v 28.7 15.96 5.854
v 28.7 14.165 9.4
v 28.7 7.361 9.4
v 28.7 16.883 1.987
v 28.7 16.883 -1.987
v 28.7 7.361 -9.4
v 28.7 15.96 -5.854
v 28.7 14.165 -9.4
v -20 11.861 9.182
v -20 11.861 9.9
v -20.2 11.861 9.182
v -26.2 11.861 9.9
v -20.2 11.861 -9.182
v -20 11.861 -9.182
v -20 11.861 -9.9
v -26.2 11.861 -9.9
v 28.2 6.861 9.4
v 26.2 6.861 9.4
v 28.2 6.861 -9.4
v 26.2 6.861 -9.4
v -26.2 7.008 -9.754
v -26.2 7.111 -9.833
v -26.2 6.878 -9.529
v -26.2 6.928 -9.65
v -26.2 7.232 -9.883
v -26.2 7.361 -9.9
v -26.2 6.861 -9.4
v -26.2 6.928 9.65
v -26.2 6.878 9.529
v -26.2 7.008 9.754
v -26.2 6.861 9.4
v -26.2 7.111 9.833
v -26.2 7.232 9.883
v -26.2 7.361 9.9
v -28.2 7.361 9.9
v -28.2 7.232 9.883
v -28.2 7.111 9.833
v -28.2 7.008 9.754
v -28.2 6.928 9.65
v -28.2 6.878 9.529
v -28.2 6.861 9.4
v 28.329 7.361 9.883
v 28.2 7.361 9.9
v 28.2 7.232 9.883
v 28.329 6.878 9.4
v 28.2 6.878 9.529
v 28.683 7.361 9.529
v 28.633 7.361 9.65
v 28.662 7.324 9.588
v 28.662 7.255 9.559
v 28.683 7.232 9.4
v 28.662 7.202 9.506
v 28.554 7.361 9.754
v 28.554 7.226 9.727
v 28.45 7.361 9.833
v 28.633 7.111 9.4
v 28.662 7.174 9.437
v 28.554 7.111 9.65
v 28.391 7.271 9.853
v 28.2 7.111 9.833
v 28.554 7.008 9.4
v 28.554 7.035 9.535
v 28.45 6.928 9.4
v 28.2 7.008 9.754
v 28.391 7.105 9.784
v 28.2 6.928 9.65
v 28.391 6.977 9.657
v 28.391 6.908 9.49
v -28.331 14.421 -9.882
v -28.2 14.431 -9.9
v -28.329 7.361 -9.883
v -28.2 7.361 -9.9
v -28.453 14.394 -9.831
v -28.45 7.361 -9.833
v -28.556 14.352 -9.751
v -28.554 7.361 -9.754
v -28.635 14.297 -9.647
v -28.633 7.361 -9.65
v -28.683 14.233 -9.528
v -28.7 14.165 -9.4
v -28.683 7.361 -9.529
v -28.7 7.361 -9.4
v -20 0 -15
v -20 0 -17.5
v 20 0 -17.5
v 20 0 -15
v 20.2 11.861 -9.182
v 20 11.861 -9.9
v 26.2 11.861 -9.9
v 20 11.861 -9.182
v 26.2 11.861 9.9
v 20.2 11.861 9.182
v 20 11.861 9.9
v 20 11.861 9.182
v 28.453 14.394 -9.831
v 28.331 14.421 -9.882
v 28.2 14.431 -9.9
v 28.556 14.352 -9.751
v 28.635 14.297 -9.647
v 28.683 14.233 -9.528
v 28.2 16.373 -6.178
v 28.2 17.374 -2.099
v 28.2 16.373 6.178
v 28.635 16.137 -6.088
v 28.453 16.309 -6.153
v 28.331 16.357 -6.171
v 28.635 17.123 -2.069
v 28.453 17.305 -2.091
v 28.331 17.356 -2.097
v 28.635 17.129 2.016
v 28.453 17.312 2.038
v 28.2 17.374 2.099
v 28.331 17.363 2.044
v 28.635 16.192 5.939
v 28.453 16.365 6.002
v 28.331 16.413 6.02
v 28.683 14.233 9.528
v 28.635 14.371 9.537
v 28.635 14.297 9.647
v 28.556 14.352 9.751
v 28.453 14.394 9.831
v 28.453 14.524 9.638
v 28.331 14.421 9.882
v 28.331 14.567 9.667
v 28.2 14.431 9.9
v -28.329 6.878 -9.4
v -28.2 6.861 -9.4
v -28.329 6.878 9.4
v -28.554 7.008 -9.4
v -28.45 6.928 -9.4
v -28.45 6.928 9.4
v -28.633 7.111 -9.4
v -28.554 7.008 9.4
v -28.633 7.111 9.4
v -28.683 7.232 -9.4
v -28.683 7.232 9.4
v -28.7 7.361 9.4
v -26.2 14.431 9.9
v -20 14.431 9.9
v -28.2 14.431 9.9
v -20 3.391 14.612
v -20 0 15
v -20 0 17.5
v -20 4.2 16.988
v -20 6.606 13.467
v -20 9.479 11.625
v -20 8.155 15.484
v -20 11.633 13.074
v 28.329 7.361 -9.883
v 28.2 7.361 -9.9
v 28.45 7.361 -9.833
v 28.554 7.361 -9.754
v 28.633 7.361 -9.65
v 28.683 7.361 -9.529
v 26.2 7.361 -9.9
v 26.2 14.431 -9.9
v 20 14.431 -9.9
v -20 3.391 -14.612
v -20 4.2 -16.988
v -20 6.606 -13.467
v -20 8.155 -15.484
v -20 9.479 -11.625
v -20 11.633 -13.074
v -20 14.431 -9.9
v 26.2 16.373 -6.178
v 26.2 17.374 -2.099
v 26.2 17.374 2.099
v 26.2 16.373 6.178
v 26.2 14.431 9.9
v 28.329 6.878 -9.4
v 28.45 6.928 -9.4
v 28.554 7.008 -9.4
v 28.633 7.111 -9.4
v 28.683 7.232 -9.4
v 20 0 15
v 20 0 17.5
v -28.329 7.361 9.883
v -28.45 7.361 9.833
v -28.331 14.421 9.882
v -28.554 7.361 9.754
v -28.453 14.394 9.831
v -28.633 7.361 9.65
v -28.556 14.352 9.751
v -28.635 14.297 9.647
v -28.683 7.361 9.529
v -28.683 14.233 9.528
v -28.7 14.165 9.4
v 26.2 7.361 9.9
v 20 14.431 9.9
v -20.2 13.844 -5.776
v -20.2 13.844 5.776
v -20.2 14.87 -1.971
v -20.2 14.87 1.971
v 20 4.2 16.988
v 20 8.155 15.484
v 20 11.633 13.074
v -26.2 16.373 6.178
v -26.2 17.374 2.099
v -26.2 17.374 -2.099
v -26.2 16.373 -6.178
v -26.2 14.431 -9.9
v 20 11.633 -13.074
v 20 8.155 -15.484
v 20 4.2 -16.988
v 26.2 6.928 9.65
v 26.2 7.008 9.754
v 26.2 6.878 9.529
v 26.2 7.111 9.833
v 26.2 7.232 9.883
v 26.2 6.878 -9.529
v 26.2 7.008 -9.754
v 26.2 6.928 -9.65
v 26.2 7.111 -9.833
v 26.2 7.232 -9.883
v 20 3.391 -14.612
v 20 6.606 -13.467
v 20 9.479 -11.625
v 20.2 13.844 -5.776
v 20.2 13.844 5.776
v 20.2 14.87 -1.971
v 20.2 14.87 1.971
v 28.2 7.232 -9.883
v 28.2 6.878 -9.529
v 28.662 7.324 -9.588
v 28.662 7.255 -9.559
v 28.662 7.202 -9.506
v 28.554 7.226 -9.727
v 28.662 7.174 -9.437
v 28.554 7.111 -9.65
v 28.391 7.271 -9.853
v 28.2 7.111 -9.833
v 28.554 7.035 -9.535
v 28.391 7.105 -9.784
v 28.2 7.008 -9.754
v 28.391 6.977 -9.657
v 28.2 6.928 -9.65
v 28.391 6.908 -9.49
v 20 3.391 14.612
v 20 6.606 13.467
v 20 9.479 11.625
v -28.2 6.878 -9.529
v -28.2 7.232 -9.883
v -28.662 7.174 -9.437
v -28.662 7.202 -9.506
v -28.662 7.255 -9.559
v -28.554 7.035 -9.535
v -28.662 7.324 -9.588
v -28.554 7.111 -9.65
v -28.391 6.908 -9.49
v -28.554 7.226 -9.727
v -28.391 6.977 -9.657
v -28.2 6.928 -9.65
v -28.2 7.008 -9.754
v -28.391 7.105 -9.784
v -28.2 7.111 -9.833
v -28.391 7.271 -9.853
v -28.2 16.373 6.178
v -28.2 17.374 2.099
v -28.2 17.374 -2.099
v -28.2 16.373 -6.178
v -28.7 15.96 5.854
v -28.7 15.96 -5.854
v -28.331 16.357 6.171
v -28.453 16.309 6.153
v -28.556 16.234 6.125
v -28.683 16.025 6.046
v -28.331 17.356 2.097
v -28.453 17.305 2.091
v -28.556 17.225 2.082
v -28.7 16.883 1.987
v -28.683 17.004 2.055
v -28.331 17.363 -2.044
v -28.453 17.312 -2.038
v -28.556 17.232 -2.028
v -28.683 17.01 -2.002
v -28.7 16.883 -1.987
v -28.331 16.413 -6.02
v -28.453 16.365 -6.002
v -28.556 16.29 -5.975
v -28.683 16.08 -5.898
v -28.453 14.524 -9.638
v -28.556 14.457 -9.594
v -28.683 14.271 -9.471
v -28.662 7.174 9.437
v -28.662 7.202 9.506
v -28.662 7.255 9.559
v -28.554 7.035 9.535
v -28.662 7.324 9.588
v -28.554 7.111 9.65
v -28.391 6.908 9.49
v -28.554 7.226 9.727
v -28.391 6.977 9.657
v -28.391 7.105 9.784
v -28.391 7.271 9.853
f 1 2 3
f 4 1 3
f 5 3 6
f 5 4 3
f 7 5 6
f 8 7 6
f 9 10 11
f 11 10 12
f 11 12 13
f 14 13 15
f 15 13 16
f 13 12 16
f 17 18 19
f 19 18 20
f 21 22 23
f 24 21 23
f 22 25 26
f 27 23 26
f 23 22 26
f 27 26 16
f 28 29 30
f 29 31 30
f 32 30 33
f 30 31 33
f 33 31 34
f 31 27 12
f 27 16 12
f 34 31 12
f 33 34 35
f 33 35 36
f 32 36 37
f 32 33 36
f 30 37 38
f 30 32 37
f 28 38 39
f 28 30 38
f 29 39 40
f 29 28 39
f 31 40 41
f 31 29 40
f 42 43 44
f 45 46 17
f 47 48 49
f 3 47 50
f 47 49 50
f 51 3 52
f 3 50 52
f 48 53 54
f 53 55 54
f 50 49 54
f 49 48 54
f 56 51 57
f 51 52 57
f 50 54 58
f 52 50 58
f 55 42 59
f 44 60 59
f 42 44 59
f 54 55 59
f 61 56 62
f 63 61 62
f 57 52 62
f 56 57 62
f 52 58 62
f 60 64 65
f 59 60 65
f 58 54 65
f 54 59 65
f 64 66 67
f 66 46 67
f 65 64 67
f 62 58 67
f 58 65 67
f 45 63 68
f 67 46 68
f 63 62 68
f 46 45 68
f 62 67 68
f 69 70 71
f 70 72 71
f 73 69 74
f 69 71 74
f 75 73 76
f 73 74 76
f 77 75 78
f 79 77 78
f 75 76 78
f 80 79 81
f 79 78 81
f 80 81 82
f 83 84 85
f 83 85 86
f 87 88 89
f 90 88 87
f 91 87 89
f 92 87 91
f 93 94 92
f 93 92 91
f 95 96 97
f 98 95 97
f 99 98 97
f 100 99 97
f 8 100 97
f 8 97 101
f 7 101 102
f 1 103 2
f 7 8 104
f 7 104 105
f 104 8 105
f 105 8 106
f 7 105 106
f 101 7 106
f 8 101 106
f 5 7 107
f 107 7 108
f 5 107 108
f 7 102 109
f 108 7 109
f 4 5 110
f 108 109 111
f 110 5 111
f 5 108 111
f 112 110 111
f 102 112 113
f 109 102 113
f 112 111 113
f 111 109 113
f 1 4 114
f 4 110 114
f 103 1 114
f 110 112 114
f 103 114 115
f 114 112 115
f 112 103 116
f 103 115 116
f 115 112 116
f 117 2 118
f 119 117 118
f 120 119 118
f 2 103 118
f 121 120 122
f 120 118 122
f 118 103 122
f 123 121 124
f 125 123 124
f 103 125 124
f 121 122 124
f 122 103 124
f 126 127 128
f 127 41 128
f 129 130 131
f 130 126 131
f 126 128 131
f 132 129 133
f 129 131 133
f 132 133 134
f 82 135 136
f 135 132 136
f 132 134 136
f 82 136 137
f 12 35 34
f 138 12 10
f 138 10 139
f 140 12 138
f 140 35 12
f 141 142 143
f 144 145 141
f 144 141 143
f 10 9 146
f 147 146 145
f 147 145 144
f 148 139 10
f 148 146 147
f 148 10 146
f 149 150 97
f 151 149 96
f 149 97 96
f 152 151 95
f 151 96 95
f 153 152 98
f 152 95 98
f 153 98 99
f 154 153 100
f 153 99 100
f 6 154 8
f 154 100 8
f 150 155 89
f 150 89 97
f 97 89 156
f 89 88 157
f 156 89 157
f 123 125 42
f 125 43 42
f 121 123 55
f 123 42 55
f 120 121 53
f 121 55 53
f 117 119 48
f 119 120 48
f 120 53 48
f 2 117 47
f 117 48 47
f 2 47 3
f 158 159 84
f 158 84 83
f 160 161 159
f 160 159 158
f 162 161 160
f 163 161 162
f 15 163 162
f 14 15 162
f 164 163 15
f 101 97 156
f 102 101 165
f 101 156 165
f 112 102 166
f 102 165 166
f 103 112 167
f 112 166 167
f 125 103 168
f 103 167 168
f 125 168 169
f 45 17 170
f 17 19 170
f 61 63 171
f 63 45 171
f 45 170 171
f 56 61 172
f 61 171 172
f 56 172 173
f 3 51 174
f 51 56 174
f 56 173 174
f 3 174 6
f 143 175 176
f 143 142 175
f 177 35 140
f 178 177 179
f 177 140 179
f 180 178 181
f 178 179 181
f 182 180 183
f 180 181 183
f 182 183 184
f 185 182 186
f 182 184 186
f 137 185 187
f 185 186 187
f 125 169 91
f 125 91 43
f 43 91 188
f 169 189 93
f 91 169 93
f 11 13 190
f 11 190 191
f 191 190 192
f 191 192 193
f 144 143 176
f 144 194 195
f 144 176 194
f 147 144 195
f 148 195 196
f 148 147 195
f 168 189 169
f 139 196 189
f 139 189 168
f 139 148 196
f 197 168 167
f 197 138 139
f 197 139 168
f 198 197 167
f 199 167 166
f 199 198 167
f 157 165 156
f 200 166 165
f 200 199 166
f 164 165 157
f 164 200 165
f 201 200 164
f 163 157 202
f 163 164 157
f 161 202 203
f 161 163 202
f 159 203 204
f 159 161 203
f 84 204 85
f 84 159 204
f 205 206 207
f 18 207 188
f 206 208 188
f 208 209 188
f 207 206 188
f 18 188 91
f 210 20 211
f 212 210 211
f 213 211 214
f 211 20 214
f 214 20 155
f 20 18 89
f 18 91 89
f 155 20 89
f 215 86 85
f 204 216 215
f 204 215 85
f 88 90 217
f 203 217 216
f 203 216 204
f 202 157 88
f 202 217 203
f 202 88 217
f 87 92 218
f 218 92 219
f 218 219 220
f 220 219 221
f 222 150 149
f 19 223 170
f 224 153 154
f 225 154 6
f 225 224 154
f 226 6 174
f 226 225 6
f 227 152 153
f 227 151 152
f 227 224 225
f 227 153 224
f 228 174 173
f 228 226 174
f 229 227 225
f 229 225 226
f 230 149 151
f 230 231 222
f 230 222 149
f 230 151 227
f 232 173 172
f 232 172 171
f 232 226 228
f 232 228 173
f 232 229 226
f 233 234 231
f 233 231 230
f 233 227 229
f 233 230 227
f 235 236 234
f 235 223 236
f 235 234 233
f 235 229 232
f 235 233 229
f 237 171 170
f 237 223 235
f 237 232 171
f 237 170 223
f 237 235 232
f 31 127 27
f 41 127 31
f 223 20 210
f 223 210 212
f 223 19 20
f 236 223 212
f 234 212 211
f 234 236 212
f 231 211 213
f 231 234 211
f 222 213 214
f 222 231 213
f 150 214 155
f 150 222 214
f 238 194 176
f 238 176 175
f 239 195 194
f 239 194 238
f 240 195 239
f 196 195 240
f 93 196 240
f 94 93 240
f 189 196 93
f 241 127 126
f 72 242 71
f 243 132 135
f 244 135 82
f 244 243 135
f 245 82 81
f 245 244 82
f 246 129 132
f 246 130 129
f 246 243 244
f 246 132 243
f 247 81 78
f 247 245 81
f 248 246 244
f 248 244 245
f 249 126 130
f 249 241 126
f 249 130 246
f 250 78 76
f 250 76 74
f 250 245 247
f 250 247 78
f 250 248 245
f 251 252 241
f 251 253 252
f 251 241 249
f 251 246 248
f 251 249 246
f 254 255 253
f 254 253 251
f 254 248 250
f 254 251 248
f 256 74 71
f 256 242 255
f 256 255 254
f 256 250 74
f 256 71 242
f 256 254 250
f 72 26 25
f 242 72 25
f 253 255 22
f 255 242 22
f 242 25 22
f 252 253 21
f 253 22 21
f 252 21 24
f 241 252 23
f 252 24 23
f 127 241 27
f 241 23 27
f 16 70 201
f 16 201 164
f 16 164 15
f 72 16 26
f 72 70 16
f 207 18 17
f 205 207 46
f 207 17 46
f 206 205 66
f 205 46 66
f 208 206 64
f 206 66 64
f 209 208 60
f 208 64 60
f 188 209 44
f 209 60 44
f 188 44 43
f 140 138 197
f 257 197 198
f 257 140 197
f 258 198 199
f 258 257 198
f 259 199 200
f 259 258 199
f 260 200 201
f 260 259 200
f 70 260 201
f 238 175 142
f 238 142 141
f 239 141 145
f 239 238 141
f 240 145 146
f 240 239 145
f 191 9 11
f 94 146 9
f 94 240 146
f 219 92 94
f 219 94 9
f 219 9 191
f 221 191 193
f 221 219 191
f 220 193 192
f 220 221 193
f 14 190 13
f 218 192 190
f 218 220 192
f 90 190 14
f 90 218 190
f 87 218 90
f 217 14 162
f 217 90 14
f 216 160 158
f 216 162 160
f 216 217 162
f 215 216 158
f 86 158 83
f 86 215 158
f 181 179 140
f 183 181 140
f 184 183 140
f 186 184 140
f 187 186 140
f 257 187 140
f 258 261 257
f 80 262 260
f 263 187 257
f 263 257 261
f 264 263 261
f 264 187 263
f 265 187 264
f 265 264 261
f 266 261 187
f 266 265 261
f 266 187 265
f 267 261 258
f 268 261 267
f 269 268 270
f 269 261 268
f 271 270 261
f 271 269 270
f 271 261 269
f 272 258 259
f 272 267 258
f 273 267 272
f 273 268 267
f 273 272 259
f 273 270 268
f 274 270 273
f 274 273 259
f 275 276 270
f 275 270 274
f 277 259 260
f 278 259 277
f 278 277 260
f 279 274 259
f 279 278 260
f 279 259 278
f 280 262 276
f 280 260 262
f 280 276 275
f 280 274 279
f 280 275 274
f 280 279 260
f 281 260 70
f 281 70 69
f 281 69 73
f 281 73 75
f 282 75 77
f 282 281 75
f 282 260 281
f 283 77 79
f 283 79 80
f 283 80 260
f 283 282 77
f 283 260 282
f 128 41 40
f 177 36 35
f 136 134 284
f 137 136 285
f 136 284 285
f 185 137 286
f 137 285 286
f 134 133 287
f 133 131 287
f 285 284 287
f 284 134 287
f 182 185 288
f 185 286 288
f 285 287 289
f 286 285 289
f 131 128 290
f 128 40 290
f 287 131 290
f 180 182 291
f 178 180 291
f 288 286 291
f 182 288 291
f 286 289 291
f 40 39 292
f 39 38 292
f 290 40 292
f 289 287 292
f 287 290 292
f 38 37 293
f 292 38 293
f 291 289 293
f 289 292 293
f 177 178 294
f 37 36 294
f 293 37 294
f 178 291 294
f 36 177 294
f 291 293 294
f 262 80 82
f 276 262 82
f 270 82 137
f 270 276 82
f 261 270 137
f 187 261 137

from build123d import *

# Parameters (mm, degrees)
LOWER_HALF_CUT_DEPTH   = 58.950496115
SIDE_SHELL_CUT_1_DEPTH = 6.2
SIDE_START             = -6.2
SIDE_SHELL_CUT_2_DEPTH = 6.2
BOSS_EXTRUDE3_START    = 2.5
BOSS_EXTRUDE3_DEPTH    = 2.5
BOSS_EXTRUDE4_DEPTH    = 2.5
FILLET2_R              = 0.5


with BuildPart() as part:
    # Sketch1 → Revolve1 (revolve)
    with BuildSketch(Plane.XY, mode=Mode.PRIVATE) as revolve1_sk:
        Polygon((20.2, 0), (26.2, 0), (26.2, 17.5), (-26.2, 17.5), (-26.2, 0), (-20.2, 0), (-20.2, 15), (20.2, 15), align=None)
    revolve(revolve1_sk.sketch.rotate(Axis((0, 0, 0), (-1, 0, 0)), 90), axis=Axis((0, 0, 0), (-1, 0, 0)))

    # Sketch2 → lower half cut (cut, through all)
    with BuildSketch(Plane.ZY.offset(26.2)):
        with BuildLine():
            Line((-17.5, 0), (17.5, 0))
            ThreePointArc((17.5, 0), (0, -17.5), (-17.5, 0))
        make_face()
    extrude(amount=-LOWER_HALF_CUT_DEPTH, mode=Mode.SUBTRACT)

    # Sketch3 → side shell cut 1 (cut)
    with BuildSketch(Plane.ZY.offset(26.2)):
        with BuildLine():
            Line((-17.5, 0), (17.5, 0))
            ThreePointArc((17.5, 0), (15.483862567, 8.154753215), (9.9, 14.430523206))
            Line((9.9, 14.430523206), (9.9, 11.861406616))
            Line((9.9, 11.861406616), (-9.9, 11.861406616))
            Line((-9.9, 11.861406616), (-9.9, 14.430523206))
            ThreePointArc((-9.9, 14.430523206), (-15.483862567, 8.154753215), (-17.5, 0))
        make_face()
    extrude(amount=-SIDE_SHELL_CUT_1_DEPTH, mode=Mode.SUBTRACT)

    # Sketch4 → side shell cut 2 (cut)
    with BuildSketch(Plane(origin=(26.2, 0, 0), x_dir=(0, 0, -1), z_dir=(1, 0, 0)).offset(SIDE_START)):
        with BuildLine():
            Line((-17.5, 0), (17.5, 0))
            ThreePointArc((17.5, 0), (15.483862567, 8.154753215), (9.9, 14.430523206))
            Line((9.9, 14.430523206), (9.9, 11.861406616))
            Line((9.9, 11.861406616), (-9.9, 11.861406616))
            Line((-9.9, 11.861406616), (-9.9, 14.430523206))
            ThreePointArc((-9.9, 14.430523206), (-15.483862567, 8.154753215), (-17.5, 0))
        make_face()
    extrude(amount=SIDE_SHELL_CUT_2_DEPTH, mode=Mode.SUBTRACT)

    # Sketch5 → Boss-Extrude3 (add)
    with BuildSketch(Plane.ZY.offset(26.2).offset(BOSS_EXTRUDE3_START)):
        with BuildLine():
            Line((-9.9, 14.430523206), (-9.9, 11.861406616))
            Line((-9.9, 11.861406616), (-9.9, 6.861406616))
            Line((-9.9, 6.861406616), (9.9, 6.861406616))
            Line((9.9, 6.861406616), (9.9, 11.861406616))
            Line((9.9, 11.861406616), (9.9, 14.430523206))
            ThreePointArc((9.9, 14.430523206), (0, 17.5), (-9.9, 14.430523206))
        make_face()
    extrude(amount=-BOSS_EXTRUDE3_DEPTH)

    # Sketch7 → Boss-Extrude4 (add)
    with BuildSketch(Plane(origin=(26.2, 0, 0), x_dir=(0, 0, -1), z_dir=(1, 0, 0))):
        with BuildLine():
            Line((-9.9, 6.861406616), (9.9, 6.861406616))
            Line((9.9, 6.861406616), (9.9, 14.430523206))
            ThreePointArc((9.9, 14.430523206), (0, 17.5), (-9.9, 14.430523206))
            Line((-9.9, 14.430523206), (-9.9, 6.861406616))
        make_face()
    extrude(amount=BOSS_EXTRUDE4_DEPTH)

    # Fillet2
    fillet2_edges = [part.edges().sort_by_distance(p)[0] for p in [
        (27.45, 6.861406616, -9.9),
        (27.45, 6.861406616, 9.9),
        (28.7, 10.645964911, -9.9),
        (28.7, 17.5, 0),
        (28.7, 10.645964911, 9.9),
        (28.7, 6.861406616, 0),
        (-27.45, 6.861406616, -9.9),
        (-27.45, 6.861406616, 9.9),
        (-28.7, 6.861406616, 0),
        (-28.7, 10.645964911, 9.9),
        (-28.7, 17.5, 0),
        (-28.7, 10.645964911, -9.9),
    ]]
    fillet(fillet2_edges, radius=FILLET2_R)


solid = part.part
